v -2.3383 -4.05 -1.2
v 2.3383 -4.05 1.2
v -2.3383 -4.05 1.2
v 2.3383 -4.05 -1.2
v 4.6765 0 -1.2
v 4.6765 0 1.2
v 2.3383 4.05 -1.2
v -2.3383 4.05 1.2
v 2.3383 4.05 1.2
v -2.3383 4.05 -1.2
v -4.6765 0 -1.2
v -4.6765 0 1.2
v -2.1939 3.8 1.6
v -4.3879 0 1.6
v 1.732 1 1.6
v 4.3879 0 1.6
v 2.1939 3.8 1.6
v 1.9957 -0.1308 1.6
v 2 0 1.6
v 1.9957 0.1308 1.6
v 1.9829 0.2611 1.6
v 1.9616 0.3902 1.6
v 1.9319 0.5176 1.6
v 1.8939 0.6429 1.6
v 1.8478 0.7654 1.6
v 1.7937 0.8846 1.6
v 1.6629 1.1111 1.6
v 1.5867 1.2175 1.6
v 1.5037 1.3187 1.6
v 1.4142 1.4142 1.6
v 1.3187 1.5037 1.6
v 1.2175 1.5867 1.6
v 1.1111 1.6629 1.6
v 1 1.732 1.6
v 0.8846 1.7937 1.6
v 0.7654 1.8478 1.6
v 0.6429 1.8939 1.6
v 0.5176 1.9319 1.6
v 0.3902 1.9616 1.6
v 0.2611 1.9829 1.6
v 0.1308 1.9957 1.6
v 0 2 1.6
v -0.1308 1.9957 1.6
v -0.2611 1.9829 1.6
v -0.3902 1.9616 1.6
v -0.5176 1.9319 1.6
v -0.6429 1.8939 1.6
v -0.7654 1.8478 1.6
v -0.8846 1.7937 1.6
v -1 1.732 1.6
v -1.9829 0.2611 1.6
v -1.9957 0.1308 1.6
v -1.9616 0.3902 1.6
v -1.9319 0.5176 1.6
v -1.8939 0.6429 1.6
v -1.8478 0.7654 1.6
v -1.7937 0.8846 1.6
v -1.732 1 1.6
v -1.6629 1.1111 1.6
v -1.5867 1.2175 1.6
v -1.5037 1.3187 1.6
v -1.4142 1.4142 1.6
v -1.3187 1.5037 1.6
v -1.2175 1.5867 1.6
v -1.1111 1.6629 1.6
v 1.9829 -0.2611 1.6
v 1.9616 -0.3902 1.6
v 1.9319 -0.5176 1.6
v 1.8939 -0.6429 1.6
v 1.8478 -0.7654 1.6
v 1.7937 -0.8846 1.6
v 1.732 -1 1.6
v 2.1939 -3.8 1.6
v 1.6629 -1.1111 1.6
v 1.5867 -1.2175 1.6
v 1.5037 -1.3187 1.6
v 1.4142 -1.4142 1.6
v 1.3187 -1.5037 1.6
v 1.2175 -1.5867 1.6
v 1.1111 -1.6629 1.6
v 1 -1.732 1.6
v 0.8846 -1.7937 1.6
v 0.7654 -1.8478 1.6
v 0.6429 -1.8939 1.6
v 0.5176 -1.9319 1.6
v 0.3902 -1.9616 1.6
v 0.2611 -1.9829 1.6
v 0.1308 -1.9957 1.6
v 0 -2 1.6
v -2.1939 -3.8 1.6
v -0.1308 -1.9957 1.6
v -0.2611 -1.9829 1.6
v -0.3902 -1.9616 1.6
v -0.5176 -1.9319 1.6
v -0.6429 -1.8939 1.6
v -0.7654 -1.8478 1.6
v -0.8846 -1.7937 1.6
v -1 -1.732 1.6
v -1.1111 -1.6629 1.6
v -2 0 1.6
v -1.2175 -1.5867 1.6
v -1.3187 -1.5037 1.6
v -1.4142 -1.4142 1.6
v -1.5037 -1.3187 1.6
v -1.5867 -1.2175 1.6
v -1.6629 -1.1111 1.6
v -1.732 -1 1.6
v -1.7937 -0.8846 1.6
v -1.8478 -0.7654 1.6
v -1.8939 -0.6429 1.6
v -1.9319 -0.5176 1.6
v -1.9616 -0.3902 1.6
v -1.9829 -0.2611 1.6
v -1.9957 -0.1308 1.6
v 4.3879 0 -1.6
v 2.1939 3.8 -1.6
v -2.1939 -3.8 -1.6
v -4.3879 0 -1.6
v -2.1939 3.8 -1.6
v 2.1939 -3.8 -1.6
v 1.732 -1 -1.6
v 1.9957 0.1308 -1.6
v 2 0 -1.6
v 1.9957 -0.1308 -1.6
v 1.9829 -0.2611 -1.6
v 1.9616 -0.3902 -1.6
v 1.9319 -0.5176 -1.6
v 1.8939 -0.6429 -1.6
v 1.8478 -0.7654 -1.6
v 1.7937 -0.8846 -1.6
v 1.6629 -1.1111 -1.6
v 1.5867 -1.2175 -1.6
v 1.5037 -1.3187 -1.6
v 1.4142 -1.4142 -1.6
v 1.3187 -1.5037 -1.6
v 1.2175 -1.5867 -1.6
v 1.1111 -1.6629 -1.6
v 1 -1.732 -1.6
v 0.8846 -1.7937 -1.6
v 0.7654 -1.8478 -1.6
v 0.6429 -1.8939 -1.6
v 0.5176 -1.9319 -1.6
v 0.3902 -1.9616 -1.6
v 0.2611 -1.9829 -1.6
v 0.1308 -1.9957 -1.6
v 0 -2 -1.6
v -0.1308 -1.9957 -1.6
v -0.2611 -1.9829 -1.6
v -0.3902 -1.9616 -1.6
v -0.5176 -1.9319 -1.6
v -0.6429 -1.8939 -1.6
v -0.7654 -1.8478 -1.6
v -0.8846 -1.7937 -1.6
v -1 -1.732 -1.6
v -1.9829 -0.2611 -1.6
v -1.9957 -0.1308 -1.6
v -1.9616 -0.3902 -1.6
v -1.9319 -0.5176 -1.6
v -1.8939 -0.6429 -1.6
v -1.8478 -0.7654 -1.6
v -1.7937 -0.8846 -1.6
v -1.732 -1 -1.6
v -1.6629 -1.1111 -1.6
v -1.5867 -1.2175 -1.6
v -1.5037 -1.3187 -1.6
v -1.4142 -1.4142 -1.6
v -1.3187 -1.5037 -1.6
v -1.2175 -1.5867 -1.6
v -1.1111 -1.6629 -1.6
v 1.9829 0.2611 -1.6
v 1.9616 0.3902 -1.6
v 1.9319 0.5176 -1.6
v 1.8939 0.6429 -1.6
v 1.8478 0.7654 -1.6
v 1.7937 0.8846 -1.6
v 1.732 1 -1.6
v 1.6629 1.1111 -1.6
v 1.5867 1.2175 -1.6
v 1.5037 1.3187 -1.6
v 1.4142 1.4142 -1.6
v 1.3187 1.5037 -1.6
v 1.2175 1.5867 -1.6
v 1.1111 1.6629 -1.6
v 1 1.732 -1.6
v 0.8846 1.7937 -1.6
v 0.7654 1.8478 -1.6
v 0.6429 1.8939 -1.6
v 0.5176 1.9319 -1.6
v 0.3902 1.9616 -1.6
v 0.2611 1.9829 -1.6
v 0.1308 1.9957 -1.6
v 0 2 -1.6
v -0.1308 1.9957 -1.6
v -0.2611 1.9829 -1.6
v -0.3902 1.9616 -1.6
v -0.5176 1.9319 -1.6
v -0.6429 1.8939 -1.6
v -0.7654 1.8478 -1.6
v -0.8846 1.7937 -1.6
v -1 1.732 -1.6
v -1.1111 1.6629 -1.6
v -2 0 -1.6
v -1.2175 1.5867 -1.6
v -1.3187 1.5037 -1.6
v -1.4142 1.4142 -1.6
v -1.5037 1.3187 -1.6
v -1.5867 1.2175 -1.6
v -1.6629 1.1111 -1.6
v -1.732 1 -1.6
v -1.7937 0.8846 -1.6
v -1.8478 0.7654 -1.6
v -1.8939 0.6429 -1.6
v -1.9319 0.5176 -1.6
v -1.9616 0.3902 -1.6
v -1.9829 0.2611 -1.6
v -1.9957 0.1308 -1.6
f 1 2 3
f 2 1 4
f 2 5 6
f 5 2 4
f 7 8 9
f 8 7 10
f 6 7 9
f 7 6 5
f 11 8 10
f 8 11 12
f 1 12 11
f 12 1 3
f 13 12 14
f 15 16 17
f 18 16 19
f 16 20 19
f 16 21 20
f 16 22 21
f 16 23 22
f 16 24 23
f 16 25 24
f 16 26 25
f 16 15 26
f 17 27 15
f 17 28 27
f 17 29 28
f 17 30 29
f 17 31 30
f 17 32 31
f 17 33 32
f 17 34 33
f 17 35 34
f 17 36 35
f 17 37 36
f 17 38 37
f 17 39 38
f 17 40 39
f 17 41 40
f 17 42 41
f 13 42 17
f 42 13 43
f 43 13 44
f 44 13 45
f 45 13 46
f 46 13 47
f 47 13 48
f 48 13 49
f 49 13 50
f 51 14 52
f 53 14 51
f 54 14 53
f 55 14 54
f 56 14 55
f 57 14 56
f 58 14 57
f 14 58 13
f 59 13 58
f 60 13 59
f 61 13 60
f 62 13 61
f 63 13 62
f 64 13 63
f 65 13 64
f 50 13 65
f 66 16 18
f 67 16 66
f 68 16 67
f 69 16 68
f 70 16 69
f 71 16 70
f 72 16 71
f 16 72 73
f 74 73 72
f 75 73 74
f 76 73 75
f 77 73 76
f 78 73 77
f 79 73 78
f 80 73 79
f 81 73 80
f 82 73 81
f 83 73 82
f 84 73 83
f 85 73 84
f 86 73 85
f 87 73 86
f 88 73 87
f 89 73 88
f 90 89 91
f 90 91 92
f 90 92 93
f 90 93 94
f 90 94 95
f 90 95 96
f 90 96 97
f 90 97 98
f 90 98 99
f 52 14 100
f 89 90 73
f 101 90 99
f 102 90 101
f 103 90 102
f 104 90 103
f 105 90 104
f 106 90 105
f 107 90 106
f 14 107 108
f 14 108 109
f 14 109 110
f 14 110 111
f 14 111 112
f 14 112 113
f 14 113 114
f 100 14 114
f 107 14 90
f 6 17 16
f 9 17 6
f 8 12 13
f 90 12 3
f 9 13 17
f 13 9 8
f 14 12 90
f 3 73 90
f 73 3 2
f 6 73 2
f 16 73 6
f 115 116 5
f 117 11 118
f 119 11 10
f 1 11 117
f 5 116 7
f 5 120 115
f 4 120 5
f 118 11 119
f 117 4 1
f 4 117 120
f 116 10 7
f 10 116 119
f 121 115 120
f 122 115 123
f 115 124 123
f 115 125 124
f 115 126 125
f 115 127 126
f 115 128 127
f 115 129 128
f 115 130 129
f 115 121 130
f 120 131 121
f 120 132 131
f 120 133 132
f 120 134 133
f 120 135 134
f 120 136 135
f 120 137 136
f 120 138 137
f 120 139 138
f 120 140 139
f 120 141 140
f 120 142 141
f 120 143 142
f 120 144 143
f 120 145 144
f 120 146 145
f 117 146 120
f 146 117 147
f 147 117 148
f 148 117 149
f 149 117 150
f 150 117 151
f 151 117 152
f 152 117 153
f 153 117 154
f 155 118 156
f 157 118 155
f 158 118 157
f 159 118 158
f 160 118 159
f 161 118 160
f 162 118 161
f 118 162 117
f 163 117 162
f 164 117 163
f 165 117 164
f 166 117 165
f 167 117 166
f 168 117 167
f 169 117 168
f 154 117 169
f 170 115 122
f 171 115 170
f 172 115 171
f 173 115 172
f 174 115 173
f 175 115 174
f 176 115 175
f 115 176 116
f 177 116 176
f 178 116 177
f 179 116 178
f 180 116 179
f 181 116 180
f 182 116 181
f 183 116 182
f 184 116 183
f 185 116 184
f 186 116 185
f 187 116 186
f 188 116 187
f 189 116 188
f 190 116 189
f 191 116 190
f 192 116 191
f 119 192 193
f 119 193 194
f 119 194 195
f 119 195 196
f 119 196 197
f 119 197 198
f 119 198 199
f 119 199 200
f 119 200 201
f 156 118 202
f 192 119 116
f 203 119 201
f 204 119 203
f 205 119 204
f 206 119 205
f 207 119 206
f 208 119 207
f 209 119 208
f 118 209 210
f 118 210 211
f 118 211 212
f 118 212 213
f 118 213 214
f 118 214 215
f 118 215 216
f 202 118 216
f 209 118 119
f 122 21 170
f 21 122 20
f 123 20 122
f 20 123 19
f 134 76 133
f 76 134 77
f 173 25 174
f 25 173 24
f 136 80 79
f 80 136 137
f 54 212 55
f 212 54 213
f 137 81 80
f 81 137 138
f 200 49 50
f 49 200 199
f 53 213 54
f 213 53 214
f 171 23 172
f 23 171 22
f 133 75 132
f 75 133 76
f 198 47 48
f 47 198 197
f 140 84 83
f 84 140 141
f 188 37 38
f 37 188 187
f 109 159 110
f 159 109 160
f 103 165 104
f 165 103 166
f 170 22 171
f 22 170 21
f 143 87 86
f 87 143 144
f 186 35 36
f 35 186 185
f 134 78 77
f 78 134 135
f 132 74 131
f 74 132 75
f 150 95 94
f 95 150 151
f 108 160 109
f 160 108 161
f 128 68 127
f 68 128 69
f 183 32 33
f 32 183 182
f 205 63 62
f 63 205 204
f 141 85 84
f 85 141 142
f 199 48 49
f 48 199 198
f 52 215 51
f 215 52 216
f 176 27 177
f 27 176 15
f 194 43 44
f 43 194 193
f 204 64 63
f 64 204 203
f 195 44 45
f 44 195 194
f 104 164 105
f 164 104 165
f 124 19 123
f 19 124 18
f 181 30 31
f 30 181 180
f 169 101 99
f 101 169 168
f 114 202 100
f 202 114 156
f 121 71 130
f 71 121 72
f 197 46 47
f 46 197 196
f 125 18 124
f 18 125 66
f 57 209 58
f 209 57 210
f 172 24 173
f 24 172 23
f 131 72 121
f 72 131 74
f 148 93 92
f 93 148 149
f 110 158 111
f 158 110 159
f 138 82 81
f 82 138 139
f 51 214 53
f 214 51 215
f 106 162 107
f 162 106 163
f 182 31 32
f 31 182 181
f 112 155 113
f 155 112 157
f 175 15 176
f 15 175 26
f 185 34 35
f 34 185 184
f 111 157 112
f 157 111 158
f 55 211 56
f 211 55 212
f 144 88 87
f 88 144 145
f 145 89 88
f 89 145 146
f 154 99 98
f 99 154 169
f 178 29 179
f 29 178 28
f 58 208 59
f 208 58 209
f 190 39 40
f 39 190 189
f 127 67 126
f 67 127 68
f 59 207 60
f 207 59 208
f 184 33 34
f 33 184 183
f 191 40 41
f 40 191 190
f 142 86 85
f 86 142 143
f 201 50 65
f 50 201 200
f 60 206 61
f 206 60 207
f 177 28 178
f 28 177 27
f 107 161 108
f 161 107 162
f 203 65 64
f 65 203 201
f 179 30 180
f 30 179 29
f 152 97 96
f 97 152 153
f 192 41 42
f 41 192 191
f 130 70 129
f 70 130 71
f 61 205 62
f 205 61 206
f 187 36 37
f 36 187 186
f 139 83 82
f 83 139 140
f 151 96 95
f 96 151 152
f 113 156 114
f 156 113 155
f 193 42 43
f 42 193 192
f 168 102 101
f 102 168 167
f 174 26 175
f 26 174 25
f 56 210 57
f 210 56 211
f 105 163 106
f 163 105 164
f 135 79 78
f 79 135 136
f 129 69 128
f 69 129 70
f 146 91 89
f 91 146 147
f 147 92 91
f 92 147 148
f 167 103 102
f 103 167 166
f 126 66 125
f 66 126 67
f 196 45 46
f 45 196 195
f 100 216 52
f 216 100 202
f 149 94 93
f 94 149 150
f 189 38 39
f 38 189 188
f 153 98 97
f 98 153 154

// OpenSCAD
// Hex nut: 4.0mm screw, 8.1mm across flats, 3.2mm thick

af = 8.1;          // across flats (mm)
th = 3.2;          // thickness (mm)
hole_d = 4.0;      // through-hole diameter (mm) for M4 screw (simple clearance)
chamfer = 0.4;     // edge chamfer height (mm)
eps = 0.02;

$fn = 96;

module hex_prism(h, af_dim) {
    // For a 6-sided cylinder, across-flats = 2 * r * cos(30) = r * sqrt(3)
    r = af_dim / sqrt(3);
    cylinder(h=h, r=r, $fn=6, center=true);
}

module hex_nut() {
    difference() {
        // Outer body with top/bottom chamfers, all connected as one solid
        union() {
            // Middle straight section
            hex_prism(th - 2*chamfer, af);

            // Top chamfer (slightly smaller AF at the very top)
            translate([0, 0, (th - chamfer)/2])
                cylinder(h=chamfer, r1=(af/sqrt(3)), r2=((af - 0.5)/sqrt(3)), $fn=6, center=true);

            // Bottom chamfer
            translate([0, 0, -(th - chamfer)/2])
                cylinder(h=chamfer, r1=((af - 0.5)/sqrt(3)), r2=(af/sqrt(3)), $fn=6, center=true);
        }

        // Through-hole
        cylinder(h=th + 2*eps, d=hole_d, center=true, $fn=96);
    }
}

hex_nut();
